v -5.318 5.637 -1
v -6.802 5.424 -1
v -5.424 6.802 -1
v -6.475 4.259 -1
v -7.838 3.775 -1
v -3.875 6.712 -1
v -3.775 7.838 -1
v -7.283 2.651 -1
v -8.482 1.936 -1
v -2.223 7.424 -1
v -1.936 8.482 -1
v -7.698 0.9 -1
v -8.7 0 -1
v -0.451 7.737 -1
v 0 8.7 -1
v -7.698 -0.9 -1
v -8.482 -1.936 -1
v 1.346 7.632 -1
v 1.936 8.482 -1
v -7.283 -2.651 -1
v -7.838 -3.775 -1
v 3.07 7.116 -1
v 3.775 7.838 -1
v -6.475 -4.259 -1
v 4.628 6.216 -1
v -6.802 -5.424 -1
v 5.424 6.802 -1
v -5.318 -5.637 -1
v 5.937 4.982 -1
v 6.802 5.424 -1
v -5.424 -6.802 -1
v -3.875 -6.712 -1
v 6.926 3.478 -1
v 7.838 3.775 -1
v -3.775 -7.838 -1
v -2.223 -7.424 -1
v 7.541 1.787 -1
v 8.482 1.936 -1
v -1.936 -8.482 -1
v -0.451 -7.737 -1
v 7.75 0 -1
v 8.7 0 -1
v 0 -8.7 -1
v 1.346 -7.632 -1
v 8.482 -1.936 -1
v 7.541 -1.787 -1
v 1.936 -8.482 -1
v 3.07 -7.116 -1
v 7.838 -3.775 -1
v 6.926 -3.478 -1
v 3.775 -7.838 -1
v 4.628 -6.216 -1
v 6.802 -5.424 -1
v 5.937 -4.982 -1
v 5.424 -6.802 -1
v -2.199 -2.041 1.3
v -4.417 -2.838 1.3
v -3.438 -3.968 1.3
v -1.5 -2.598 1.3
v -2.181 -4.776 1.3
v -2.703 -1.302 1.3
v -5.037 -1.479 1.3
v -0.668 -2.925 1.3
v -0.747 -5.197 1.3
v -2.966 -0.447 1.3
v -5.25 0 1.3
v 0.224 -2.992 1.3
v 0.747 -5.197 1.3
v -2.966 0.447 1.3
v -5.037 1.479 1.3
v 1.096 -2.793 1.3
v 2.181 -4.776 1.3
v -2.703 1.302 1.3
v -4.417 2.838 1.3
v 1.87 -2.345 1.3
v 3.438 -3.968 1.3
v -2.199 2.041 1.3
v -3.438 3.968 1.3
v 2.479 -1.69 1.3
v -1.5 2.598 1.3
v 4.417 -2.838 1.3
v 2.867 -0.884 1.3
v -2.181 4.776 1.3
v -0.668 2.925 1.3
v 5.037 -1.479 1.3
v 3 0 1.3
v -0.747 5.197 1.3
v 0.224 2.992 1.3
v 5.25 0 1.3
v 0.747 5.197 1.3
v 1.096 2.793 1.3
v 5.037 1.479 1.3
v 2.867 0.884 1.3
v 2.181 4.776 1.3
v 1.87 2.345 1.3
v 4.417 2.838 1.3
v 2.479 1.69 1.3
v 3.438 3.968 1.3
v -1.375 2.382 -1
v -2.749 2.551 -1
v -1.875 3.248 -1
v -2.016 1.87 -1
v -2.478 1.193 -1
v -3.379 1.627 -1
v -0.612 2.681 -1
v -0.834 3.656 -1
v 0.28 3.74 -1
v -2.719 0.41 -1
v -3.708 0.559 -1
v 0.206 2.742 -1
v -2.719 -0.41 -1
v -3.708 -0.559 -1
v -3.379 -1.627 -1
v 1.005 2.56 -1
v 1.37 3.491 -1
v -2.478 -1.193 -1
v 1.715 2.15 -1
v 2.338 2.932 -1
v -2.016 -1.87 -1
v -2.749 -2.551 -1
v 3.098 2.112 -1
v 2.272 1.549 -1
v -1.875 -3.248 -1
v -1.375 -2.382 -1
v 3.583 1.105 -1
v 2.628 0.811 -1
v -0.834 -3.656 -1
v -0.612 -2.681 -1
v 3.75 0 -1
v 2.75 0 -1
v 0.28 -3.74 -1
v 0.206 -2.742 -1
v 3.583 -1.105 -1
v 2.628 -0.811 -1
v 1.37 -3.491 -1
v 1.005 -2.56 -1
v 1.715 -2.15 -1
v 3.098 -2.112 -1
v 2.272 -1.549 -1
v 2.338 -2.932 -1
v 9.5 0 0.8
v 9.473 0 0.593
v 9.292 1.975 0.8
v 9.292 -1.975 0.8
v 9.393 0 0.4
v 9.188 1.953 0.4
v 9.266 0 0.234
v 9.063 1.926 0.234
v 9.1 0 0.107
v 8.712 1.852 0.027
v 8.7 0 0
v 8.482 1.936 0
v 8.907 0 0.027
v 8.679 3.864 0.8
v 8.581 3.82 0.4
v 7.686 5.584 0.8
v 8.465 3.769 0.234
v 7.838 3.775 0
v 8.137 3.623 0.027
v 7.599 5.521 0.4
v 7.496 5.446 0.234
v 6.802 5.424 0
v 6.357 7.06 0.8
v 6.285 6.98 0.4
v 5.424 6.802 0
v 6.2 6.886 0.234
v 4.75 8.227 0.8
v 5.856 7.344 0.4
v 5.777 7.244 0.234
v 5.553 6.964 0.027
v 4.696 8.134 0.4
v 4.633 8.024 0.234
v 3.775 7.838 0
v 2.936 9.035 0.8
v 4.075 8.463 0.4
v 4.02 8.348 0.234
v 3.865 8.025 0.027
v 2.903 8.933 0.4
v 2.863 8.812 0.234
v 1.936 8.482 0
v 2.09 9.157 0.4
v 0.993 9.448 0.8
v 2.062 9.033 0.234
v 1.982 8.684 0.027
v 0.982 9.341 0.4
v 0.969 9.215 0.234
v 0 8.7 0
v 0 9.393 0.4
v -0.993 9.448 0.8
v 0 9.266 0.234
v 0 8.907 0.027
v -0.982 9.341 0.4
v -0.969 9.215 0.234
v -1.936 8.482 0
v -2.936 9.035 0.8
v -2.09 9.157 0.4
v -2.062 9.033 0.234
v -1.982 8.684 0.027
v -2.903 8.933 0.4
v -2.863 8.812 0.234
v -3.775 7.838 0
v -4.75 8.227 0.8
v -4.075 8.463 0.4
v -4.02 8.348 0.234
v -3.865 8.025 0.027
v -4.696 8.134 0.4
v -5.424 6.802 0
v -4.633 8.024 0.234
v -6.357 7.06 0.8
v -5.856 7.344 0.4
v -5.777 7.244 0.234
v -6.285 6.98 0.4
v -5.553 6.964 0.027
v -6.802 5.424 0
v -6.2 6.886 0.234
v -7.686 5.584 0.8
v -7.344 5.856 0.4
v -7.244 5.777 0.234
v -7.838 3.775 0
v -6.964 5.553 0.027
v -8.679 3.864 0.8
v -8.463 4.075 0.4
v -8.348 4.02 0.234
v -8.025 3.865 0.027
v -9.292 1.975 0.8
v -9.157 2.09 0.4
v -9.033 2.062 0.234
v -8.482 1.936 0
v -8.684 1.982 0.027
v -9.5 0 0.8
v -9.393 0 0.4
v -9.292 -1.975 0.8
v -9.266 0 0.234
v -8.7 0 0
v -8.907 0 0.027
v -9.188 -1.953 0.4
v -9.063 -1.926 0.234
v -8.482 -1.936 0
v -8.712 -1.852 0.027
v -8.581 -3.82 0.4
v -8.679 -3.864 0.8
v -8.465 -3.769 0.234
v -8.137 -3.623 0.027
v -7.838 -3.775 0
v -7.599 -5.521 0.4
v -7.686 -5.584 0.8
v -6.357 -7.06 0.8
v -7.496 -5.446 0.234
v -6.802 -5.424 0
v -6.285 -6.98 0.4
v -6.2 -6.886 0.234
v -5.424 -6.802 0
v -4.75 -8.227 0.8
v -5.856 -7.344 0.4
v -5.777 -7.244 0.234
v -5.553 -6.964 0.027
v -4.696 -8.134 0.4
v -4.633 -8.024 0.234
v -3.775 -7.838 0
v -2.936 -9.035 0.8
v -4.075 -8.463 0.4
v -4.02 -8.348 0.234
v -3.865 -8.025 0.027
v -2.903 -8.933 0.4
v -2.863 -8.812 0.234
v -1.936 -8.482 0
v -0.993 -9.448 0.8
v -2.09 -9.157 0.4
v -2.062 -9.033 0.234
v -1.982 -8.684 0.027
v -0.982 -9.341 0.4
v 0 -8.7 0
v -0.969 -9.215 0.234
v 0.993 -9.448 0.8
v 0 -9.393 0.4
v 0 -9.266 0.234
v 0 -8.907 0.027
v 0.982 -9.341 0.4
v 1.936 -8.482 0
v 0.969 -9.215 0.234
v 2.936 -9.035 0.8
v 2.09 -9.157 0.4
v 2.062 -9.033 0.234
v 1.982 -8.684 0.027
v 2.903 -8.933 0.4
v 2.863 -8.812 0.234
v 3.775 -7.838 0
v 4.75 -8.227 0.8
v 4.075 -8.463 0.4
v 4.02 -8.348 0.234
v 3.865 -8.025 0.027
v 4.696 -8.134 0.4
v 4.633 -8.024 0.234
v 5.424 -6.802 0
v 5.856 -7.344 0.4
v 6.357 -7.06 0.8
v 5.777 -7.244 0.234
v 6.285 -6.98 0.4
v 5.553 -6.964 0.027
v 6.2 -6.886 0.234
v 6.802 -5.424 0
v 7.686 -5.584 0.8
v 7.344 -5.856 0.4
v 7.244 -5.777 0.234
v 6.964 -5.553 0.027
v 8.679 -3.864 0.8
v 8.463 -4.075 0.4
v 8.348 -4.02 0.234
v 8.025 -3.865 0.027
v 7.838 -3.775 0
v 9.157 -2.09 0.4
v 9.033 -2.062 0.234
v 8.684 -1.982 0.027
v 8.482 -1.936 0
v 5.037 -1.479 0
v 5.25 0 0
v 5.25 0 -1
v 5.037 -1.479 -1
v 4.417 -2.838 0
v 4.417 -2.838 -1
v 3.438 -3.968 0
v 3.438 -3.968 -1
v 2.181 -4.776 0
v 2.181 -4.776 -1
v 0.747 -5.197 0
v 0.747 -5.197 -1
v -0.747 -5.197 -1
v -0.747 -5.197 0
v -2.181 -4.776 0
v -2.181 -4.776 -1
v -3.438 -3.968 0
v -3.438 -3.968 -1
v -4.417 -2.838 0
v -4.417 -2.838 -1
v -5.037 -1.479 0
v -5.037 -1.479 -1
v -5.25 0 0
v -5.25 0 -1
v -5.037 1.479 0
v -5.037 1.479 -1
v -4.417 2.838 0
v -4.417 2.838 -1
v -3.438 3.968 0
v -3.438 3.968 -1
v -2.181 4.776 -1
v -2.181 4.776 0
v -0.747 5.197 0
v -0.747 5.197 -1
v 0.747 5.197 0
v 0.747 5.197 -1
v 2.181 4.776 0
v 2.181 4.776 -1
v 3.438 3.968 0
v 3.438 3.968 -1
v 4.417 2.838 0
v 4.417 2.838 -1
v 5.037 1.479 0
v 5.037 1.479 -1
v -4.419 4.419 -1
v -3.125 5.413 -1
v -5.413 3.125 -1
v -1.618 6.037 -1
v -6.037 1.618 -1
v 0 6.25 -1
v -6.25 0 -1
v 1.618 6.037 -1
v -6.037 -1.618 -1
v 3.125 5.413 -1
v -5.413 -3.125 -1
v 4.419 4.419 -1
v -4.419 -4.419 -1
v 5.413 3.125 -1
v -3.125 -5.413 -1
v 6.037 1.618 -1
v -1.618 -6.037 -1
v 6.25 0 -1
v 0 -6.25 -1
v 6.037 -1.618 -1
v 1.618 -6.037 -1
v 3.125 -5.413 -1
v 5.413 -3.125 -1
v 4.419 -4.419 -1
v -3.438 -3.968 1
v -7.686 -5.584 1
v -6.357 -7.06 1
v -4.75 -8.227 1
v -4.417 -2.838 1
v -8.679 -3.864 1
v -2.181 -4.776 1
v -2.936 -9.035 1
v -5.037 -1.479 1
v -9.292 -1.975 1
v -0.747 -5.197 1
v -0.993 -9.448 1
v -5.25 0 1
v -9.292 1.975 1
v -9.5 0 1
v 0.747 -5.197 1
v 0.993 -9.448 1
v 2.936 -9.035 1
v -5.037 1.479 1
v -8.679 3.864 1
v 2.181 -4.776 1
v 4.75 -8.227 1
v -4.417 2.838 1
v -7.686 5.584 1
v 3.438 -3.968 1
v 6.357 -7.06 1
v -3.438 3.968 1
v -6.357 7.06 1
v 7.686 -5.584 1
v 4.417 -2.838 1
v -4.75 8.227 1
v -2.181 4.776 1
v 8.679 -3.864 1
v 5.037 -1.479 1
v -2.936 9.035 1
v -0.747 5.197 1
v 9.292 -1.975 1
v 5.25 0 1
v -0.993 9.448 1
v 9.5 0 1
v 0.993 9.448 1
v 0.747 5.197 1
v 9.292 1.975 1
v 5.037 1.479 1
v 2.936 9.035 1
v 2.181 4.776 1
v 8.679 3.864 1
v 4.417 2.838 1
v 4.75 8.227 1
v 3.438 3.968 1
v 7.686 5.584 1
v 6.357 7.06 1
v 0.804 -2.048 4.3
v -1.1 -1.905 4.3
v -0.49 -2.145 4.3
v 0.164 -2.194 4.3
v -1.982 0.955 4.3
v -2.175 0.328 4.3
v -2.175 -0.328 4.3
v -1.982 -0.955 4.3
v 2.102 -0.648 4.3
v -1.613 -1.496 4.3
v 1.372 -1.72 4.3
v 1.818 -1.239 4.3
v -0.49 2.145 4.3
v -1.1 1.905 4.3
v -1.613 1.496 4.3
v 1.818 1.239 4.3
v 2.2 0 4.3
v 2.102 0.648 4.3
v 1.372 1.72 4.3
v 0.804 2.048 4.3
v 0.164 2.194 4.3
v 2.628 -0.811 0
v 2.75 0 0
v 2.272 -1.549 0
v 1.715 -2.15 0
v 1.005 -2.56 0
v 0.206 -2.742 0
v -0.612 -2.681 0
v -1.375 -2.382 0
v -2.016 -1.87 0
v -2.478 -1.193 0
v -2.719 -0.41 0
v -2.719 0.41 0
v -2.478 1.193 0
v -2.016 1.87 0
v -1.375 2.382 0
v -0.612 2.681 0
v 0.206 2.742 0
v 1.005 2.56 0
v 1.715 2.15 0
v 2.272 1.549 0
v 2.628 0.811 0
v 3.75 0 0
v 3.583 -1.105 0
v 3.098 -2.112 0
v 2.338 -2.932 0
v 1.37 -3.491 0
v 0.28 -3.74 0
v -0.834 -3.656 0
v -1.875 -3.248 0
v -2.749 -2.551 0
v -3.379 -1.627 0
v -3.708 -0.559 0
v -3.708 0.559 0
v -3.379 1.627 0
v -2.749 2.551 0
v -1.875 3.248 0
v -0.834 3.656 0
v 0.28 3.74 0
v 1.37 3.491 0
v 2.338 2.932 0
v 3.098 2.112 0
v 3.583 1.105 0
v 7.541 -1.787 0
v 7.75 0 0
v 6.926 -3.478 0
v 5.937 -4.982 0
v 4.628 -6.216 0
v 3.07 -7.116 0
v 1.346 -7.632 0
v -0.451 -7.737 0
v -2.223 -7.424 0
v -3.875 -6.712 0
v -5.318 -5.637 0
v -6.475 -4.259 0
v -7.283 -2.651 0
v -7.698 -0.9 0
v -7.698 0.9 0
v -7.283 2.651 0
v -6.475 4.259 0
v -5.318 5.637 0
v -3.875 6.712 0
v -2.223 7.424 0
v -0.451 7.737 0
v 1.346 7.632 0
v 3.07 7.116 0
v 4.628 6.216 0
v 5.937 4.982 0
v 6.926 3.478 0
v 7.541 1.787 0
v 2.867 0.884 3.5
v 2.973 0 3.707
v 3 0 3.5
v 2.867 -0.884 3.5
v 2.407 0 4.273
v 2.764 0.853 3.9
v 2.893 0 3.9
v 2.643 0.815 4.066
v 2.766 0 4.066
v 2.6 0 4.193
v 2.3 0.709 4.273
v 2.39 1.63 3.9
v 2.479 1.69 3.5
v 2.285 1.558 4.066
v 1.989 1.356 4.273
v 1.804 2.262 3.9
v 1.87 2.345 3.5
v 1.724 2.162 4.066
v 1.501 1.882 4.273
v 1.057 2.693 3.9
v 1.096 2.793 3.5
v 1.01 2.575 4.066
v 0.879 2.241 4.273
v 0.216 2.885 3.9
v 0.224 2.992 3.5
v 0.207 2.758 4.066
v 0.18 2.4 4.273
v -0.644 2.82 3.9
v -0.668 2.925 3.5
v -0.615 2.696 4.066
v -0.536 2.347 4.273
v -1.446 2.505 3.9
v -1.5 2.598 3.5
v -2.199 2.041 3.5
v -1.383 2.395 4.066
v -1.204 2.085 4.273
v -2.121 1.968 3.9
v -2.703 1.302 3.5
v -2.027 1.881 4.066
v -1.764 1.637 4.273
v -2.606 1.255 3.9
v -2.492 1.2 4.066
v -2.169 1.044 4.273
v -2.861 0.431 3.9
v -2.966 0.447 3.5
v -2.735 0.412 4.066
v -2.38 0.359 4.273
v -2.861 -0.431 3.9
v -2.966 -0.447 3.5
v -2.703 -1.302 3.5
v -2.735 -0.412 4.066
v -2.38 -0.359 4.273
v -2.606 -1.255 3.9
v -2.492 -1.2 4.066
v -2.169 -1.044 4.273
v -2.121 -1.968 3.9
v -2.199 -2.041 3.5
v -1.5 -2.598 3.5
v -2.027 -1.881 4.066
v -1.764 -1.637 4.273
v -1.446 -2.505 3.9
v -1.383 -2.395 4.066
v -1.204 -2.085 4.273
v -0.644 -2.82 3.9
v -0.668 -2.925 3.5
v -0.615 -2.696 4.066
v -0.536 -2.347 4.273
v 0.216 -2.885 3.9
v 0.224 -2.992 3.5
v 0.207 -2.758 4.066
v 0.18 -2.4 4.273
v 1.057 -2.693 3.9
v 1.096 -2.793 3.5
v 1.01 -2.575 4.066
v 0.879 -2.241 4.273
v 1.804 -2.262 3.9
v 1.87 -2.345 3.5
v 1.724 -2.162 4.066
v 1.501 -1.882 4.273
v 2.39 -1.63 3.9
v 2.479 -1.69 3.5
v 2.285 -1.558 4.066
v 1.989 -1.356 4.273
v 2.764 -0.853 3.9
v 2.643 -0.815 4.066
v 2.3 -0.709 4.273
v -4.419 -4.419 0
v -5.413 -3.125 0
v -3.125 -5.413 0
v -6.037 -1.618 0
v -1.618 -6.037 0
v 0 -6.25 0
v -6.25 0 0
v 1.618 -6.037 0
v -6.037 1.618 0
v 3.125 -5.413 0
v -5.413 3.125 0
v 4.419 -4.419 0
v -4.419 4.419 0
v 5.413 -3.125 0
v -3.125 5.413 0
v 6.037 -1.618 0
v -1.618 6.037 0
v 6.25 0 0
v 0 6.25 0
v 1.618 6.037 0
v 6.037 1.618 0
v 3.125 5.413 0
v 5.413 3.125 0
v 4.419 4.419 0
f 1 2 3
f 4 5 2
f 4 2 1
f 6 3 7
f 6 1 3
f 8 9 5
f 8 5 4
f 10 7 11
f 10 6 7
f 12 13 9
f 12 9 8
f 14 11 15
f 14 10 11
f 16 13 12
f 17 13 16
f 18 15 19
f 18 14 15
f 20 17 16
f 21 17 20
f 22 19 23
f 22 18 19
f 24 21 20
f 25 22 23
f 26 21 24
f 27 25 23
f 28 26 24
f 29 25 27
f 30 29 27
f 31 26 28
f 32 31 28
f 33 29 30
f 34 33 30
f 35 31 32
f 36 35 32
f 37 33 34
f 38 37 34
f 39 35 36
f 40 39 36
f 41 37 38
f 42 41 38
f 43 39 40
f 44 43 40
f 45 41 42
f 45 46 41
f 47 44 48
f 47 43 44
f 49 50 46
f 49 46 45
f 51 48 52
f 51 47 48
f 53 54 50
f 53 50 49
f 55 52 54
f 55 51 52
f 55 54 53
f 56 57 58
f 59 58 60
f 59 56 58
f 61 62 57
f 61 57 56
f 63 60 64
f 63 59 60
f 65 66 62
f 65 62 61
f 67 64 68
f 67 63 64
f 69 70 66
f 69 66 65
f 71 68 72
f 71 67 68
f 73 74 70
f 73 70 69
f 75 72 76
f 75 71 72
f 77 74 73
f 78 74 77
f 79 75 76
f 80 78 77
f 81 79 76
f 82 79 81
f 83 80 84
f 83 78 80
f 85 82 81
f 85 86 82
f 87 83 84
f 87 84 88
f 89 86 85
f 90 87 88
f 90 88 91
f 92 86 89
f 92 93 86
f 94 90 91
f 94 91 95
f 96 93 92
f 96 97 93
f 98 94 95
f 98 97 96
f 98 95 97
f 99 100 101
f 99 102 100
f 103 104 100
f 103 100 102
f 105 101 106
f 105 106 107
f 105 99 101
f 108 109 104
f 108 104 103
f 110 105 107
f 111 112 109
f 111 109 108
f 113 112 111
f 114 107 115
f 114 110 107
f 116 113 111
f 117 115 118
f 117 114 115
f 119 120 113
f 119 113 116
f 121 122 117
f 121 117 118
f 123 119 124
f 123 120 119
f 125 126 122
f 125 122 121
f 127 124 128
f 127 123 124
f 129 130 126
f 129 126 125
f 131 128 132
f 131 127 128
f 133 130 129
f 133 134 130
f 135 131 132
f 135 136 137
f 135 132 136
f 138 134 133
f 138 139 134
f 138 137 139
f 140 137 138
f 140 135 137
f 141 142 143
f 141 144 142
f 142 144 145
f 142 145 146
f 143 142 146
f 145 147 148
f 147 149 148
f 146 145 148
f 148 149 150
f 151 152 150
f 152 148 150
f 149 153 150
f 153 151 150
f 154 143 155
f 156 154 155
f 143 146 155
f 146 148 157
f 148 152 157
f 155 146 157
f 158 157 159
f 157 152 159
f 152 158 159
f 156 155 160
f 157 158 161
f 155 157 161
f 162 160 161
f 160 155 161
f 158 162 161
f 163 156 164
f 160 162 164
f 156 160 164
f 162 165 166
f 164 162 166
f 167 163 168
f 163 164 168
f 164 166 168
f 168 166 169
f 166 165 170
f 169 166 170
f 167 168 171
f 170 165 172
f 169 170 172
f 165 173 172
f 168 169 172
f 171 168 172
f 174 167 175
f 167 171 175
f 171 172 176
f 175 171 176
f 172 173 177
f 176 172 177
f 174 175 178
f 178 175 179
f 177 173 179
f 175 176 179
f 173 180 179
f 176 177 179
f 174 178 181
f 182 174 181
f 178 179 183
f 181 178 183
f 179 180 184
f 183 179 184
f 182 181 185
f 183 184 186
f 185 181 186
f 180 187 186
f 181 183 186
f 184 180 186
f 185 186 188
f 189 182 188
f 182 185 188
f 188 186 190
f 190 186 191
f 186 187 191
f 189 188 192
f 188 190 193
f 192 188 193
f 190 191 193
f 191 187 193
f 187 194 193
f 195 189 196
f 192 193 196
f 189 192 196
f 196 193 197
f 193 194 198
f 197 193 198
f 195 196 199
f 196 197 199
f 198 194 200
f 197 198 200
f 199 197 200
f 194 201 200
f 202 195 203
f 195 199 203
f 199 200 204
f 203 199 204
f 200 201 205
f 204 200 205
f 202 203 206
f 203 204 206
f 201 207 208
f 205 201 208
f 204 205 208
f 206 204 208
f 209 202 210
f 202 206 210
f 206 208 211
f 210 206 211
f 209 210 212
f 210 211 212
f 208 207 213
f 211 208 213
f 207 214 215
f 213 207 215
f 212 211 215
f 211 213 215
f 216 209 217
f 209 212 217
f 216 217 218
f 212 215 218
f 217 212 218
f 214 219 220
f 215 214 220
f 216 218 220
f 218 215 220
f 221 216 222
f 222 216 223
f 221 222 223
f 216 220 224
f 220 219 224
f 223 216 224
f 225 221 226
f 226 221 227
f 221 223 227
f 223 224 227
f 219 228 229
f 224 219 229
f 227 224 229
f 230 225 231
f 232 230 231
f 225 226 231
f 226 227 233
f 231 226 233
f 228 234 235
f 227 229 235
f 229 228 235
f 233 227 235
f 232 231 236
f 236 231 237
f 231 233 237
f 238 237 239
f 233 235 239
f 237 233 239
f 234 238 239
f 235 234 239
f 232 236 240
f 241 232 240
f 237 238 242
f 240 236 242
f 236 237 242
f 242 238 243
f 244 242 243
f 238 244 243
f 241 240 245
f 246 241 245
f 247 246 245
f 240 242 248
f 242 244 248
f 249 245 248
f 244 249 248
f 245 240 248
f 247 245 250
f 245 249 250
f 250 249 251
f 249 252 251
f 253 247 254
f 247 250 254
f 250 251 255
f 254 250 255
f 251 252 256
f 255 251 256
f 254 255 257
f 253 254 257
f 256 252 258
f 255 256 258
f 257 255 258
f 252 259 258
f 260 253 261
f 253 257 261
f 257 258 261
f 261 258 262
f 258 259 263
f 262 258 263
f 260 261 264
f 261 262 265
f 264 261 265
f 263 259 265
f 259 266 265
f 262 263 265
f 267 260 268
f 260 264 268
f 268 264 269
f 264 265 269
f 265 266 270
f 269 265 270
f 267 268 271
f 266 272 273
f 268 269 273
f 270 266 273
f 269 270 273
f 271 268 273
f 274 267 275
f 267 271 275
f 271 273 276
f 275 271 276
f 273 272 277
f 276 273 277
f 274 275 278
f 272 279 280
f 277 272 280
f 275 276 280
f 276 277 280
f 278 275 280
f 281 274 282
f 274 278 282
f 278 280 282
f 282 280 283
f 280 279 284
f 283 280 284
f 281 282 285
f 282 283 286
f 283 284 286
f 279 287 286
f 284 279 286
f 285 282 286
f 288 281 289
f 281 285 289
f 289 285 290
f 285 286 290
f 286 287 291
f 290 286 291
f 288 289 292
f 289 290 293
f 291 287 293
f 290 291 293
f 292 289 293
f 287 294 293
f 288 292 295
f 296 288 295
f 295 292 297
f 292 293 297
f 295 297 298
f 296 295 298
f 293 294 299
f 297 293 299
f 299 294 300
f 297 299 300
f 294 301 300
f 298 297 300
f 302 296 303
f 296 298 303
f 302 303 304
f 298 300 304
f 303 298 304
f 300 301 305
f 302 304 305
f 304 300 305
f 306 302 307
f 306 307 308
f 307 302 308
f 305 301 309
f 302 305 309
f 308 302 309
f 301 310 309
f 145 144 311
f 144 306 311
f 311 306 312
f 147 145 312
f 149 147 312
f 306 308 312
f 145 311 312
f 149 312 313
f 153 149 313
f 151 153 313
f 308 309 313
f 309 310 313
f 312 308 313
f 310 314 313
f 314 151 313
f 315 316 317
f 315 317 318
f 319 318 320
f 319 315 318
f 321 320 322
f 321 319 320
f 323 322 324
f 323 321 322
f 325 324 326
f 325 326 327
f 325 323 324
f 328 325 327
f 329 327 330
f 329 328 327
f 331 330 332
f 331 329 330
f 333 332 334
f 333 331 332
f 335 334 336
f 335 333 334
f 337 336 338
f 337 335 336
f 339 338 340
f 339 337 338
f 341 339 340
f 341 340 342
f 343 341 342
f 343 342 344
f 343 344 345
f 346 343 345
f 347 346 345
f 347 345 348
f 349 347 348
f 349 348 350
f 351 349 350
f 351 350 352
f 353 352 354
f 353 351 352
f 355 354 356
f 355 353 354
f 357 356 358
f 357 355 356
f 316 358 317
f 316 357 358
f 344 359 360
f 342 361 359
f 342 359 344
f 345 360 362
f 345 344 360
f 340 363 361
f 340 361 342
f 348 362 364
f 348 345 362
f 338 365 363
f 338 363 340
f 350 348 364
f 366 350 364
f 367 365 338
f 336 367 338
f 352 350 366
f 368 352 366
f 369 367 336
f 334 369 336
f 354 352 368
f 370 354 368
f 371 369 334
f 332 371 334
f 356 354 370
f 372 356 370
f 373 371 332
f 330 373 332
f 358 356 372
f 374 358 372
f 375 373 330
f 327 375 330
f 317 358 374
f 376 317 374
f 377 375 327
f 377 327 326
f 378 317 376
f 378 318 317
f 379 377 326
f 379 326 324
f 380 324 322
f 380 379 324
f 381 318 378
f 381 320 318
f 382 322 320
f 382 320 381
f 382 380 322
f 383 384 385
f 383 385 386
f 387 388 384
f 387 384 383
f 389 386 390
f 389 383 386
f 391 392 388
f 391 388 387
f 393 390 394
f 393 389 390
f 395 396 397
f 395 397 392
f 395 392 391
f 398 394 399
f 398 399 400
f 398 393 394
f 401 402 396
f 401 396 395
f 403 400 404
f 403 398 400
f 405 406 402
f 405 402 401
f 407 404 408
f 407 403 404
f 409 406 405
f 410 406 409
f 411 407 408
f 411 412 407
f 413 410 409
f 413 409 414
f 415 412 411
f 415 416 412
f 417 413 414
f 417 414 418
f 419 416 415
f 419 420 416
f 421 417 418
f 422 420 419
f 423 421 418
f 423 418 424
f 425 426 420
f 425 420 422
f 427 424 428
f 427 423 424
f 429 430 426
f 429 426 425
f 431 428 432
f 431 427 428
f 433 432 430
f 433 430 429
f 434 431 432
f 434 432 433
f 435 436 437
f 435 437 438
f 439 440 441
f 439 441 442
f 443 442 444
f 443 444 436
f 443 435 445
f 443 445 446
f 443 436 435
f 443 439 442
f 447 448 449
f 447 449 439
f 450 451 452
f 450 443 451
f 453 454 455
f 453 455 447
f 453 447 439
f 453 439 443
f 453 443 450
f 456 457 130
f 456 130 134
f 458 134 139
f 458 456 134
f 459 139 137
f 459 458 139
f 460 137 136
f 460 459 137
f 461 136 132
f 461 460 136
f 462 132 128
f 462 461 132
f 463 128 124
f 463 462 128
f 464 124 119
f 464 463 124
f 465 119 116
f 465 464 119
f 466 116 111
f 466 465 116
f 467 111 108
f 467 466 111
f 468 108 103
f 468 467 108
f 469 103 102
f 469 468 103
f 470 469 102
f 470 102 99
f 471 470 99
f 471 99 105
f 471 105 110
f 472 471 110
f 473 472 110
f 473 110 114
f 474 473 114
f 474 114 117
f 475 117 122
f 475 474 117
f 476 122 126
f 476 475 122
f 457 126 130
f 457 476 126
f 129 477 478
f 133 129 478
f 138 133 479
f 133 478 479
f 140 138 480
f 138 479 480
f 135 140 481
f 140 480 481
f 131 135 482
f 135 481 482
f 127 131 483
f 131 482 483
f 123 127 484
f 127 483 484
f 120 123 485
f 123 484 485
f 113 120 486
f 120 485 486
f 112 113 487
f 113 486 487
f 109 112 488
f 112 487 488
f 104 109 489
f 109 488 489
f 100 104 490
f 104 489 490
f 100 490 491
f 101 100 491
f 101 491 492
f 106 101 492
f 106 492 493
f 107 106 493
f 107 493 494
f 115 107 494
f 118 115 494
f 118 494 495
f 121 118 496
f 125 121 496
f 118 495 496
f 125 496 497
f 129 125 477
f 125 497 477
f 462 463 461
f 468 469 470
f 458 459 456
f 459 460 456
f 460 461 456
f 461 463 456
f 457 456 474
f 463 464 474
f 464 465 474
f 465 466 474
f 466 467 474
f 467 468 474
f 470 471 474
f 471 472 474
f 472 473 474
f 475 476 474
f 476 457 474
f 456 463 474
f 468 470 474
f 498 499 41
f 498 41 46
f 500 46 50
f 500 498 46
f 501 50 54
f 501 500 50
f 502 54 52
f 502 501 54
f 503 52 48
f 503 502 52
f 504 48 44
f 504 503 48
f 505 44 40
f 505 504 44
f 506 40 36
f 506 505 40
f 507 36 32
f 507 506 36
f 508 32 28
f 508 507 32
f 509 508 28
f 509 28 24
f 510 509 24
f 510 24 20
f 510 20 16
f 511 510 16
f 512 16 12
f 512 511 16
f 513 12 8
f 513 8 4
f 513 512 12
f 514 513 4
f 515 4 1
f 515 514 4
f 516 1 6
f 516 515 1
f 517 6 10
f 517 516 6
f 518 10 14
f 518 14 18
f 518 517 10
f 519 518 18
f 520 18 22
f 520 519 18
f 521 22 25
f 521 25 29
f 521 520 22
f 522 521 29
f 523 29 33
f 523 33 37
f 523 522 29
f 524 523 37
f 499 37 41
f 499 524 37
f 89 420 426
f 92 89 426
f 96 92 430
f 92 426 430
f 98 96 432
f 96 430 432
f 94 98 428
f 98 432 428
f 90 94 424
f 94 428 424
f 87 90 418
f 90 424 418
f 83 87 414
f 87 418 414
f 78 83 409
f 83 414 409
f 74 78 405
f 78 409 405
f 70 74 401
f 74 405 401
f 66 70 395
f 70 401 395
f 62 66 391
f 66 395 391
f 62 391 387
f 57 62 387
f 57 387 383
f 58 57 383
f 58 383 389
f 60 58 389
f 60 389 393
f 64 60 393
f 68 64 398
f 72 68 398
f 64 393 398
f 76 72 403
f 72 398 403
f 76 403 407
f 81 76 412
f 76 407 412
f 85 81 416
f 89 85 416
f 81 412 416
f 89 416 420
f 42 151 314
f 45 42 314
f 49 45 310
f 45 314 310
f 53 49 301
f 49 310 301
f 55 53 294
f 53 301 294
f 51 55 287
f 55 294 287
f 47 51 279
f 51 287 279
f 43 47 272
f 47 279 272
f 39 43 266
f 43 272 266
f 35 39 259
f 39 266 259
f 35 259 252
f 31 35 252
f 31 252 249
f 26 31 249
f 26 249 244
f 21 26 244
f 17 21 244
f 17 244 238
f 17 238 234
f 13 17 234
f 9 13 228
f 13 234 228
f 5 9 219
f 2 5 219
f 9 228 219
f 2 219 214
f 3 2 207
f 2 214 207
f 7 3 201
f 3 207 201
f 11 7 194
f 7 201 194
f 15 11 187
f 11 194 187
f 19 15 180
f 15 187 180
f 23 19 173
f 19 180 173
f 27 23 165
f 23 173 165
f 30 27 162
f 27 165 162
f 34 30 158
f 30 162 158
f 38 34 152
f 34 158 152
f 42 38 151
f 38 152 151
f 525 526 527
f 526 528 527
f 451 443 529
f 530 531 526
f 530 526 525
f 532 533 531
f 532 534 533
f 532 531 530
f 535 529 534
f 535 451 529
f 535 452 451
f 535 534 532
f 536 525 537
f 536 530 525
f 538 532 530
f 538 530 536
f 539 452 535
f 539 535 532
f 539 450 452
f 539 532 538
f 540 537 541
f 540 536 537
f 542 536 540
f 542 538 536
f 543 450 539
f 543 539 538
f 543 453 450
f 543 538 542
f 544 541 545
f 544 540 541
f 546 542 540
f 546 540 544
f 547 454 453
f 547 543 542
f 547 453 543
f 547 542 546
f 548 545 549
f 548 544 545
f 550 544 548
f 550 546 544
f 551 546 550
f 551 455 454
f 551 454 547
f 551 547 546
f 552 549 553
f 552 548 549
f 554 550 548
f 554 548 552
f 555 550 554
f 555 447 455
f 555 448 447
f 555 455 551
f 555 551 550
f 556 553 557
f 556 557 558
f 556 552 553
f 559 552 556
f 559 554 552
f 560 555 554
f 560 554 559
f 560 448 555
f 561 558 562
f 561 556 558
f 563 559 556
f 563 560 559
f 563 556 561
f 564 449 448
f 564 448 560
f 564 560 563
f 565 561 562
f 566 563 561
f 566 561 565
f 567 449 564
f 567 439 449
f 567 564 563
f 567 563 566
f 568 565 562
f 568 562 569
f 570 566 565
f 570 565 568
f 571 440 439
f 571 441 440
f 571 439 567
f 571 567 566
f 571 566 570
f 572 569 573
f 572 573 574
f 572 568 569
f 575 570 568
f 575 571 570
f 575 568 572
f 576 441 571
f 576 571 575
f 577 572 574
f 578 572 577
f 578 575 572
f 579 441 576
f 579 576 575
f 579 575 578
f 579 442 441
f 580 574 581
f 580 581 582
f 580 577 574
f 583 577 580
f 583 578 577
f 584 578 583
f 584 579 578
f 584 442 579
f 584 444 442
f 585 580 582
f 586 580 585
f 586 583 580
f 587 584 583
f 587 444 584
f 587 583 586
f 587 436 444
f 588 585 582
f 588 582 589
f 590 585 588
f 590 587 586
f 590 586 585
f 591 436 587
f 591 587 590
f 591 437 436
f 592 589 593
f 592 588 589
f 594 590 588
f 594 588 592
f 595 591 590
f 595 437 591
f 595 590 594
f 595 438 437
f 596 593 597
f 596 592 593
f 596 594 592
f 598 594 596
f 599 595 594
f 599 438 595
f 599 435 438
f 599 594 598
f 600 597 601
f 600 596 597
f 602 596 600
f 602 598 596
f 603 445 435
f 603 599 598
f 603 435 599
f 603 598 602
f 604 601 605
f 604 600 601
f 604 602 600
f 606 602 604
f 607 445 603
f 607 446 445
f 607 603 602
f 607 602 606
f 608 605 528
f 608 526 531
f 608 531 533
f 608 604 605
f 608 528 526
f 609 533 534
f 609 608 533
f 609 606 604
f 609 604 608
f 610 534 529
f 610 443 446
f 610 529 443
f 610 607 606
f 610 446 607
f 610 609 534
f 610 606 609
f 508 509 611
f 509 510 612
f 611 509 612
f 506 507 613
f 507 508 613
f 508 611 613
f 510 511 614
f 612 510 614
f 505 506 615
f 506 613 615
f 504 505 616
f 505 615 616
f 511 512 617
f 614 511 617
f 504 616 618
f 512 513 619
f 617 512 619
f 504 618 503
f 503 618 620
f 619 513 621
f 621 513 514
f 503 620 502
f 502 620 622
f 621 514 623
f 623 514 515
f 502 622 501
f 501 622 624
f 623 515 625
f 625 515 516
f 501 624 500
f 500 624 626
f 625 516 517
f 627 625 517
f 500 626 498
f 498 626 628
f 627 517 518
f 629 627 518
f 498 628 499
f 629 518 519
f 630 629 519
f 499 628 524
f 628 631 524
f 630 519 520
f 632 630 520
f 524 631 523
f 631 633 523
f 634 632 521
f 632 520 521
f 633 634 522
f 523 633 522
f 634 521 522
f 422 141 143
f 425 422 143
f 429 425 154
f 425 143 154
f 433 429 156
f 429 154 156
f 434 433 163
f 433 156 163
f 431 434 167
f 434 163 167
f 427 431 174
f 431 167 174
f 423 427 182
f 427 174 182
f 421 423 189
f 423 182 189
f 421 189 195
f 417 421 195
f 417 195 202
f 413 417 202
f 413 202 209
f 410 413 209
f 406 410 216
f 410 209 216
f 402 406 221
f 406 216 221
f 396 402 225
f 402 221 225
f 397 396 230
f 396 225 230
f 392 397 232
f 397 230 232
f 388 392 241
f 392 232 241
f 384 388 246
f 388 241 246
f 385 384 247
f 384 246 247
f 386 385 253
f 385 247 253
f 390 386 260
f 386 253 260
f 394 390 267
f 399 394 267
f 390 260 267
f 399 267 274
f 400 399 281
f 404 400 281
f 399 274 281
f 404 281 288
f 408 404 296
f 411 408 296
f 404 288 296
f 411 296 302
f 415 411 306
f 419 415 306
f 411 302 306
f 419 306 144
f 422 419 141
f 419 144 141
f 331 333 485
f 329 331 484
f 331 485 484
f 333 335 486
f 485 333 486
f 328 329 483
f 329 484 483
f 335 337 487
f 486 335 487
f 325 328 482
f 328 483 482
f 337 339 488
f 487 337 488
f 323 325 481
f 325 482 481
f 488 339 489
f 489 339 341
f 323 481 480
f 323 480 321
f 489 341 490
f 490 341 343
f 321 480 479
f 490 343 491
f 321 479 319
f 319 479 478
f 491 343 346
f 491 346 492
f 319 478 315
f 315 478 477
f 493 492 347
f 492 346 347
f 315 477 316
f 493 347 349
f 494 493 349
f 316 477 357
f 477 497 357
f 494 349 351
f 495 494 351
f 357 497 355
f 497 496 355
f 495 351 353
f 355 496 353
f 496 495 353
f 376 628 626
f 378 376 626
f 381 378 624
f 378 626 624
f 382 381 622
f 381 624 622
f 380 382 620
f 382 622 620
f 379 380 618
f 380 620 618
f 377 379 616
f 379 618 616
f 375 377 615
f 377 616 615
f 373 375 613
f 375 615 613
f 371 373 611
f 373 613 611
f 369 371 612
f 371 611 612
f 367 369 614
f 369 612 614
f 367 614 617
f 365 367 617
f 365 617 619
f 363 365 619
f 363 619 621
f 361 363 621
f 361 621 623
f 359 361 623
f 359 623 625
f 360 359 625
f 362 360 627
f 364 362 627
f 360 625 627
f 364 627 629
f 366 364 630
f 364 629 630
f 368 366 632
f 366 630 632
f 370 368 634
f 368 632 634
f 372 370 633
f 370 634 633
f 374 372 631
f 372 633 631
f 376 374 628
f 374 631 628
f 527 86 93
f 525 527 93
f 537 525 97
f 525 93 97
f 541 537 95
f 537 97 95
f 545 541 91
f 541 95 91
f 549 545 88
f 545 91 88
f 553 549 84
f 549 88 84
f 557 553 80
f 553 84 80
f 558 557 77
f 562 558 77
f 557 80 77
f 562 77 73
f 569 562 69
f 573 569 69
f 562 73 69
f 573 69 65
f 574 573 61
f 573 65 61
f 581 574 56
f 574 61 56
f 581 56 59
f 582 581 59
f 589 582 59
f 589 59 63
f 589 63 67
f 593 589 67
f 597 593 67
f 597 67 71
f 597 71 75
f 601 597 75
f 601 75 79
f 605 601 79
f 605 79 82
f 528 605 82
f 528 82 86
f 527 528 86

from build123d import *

# Parameters (mm, degrees)
F0_R     = 9.5
F1_DEPTH = 1
F2_R     = 3
F3_DEPTH = 3.3
F4_R     = 0.8
F5_R     = 5.25
F5_R_2   = 3
F6_DEPTH = 0.3
F7_R     = 8.7
F7_R_2   = 7.75
F7_R_3   = 6.25
F7_R_4   = 5.25
F7_R_5   = 3.75
F7_R_6   = 2.75
F8_DEPTH = 1


# Not quite as in the source:
# - a feature names something its author has since deleted; it is built from what else it names


with BuildPart() as f1:
    # F0 (on Top) → F1 (new body)
    with BuildSketch(Plane.XY):
        Circle(F0_R)
    extrude(amount=F1_DEPTH)

    # F2 (on face) → F3 (join)
    with BuildSketch(Plane.XY.offset(1)):
        Circle(F2_R)
    extrude(amount=F3_DEPTH)

    # F4
    f4_edges = [f1.edges().sort_by_distance(p)[0] for p in [
        (-9.5, 0, 0),
        (-3, 0, 4.3),
    ]]
    fillet(f4_edges, radius=F4_R)

    # F5 (on face) → F6 (join)
    with BuildSketch(Plane.XY.offset(1)):
        Circle(F5_R)
        Circle(F5_R_2, mode=Mode.SUBTRACT)
        Circle(F5_R_2)
    extrude(amount=F6_DEPTH)

    # F7 (on face) → F8 (join)
    with BuildSketch(Plane(origin=(0, 0, 0), x_dir=(1, 0, 0), z_dir=(0, 0, -1))):
        Circle(F7_R)
        Circle(F7_R_2, mode=Mode.SUBTRACT)
        Circle(F7_R_3)
        Circle(F7_R_4, mode=Mode.SUBTRACT)
        Circle(F7_R_5)
        Circle(F7_R_6, mode=Mode.SUBTRACT)
    extrude(amount=F8_DEPTH)


solid = f1.part
